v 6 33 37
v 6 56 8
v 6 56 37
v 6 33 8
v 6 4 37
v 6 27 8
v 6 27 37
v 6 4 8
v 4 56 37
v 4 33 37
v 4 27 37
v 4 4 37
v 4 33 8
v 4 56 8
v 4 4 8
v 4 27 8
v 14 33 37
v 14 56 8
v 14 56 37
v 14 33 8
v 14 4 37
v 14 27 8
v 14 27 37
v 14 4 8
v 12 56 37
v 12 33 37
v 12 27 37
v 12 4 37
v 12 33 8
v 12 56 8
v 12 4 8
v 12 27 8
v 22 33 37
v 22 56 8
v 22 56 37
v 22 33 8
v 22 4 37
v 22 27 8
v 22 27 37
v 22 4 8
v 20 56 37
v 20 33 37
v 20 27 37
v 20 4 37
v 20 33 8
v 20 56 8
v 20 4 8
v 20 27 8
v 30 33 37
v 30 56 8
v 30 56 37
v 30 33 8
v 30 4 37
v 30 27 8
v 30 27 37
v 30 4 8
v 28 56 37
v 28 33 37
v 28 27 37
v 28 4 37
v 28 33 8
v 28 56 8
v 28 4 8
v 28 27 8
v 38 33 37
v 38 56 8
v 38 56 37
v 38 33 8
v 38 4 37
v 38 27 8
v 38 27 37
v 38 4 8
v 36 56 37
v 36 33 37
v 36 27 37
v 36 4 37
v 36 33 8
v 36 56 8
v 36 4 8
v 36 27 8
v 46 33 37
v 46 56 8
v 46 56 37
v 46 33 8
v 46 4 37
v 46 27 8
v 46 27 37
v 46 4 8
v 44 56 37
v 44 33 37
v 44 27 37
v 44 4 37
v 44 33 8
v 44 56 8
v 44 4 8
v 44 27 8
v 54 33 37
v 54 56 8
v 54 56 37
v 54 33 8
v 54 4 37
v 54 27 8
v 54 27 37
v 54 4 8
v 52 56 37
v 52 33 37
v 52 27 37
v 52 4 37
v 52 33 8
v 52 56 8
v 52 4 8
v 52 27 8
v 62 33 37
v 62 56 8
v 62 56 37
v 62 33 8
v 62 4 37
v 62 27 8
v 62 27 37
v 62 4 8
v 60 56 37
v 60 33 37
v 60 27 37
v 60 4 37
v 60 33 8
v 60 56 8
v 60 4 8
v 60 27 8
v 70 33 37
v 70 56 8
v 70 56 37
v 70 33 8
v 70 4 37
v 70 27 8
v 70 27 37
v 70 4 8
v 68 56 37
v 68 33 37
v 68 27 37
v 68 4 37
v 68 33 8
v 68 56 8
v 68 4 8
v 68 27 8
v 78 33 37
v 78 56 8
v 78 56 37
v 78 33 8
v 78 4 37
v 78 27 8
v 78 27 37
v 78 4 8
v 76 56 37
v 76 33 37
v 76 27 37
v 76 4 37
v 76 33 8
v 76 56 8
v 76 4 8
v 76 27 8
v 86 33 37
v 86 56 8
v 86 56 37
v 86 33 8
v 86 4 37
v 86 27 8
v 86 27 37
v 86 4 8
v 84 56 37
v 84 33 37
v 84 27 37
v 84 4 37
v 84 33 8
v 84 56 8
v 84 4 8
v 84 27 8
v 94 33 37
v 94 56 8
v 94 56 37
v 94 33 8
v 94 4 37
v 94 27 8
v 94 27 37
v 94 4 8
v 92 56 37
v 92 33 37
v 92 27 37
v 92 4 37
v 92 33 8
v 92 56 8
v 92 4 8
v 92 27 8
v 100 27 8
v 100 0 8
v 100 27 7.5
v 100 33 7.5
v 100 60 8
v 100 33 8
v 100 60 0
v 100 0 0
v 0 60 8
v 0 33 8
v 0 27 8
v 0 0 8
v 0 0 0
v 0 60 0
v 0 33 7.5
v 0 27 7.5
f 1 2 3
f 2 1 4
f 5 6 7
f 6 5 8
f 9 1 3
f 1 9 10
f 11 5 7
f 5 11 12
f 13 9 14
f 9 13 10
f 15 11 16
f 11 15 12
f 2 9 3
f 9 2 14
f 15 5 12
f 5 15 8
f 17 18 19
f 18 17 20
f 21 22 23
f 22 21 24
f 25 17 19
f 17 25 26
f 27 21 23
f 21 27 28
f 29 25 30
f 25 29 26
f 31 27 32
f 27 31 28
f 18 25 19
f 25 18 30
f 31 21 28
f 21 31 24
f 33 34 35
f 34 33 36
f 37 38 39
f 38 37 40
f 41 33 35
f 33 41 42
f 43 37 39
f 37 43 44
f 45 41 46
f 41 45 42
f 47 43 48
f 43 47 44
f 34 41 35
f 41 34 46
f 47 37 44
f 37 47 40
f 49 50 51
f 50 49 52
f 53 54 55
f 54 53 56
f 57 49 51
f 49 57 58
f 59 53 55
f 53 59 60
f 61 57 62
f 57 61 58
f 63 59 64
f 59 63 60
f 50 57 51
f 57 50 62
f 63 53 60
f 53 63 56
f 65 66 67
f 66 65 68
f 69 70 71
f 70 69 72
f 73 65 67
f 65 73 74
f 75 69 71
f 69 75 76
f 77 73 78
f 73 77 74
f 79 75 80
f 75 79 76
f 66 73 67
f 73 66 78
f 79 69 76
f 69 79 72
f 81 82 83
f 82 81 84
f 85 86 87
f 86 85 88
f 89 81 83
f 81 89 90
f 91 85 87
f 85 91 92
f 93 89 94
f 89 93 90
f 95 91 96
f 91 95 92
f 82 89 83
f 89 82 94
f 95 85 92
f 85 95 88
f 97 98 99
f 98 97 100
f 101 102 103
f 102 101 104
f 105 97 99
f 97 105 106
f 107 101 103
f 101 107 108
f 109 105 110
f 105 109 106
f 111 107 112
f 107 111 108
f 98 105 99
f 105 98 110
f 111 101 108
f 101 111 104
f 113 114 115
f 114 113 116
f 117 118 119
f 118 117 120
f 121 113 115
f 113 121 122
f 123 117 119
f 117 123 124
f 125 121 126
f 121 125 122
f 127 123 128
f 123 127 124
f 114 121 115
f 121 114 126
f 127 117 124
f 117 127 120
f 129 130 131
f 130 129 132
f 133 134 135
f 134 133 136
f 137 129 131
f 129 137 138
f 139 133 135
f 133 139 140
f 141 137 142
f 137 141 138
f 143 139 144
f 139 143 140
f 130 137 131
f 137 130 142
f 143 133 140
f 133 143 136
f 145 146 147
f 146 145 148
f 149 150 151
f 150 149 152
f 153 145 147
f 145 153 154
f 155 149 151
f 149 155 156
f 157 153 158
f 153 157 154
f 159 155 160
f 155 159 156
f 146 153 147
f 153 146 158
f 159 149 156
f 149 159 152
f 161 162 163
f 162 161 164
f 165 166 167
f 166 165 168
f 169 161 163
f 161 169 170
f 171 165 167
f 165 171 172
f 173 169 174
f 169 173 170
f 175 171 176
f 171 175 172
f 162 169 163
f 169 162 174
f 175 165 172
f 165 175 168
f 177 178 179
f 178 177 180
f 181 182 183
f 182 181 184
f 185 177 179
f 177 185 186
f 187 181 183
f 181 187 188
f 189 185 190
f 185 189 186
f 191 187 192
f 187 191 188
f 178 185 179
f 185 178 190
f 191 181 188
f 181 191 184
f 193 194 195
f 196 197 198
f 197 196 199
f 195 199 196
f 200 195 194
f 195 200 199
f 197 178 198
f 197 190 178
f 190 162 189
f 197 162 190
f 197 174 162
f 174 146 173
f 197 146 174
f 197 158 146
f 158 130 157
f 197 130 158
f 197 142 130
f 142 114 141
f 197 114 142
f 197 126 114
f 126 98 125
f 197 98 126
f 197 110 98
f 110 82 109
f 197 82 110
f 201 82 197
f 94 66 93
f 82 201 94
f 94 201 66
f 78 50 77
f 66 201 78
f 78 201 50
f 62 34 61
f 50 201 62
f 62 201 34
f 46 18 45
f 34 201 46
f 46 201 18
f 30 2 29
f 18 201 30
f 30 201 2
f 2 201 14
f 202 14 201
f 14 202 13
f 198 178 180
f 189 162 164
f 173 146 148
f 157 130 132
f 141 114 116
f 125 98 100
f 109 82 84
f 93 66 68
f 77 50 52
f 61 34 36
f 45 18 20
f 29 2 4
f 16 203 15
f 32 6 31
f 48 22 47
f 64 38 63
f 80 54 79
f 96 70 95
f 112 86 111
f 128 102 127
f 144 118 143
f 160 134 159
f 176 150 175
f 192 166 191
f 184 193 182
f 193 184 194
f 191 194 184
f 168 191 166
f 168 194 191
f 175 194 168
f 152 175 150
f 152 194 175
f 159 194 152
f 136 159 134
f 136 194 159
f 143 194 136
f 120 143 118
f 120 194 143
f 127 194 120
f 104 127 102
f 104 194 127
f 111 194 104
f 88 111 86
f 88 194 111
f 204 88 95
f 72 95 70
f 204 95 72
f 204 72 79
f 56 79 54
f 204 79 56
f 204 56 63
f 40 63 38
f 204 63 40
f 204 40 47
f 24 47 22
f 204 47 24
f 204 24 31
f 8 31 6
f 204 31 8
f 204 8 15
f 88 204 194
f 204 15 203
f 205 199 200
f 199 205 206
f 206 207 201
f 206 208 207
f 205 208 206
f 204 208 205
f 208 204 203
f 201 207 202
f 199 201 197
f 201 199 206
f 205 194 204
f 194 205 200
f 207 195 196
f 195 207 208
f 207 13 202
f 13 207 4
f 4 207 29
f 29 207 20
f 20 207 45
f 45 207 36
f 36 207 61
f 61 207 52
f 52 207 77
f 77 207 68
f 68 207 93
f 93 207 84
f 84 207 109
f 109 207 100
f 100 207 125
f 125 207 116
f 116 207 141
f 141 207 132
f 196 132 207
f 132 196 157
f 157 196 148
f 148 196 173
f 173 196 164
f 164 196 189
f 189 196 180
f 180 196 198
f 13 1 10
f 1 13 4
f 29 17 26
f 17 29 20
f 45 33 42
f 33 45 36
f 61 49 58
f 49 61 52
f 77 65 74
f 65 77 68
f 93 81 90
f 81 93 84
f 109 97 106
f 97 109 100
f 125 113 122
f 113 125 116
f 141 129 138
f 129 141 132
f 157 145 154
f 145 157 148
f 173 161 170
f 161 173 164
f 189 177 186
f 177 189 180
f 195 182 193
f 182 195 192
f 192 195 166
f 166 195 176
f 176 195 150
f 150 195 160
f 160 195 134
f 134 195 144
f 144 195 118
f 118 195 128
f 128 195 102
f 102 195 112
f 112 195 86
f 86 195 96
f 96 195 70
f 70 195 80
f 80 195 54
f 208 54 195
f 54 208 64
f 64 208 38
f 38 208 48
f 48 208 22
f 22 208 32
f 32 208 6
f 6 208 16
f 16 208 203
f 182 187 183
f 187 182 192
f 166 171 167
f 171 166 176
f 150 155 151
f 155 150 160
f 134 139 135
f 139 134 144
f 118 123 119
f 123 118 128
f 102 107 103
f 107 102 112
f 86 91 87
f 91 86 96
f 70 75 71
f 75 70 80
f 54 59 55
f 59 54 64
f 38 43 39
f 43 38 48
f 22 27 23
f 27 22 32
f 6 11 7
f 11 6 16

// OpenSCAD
$fn = 32;

// ----------------------------------------------------------------------
// Heatsink: slotted fin block
// ----------------------------------------------------------------------

// --- parameters (mm) ---
base_l = 100;             // base length, X
base_w = 60;              // base width, Y
base_t = 8;               // base plate thickness
fin_h = 30;               // fin height above the base
fin_t = 2;                // fin thickness
edge = 4;                 // margin from the base ends
pitch = 8;                // fin pitch
slot_w = 6;               // central slot width, Y

n_fins = floor((base_l - 2 * edge - fin_t) / pitch) + 1;  // fin count
total_h = base_t + fin_h - 1;  // overall height

difference() {
union() {
  cube([base_l, base_w, base_t]);
  for (i = [0 : n_fins - 1])
    translate([edge + i * pitch, edge, base_t - 1])
      cube([fin_t, base_w - 2 * edge, fin_h]);
}
  translate([-1, base_w / 2 - slot_w / 2, base_t - 0.5])
    cube([base_l + 2, slot_w, fin_h + 2]);
}
